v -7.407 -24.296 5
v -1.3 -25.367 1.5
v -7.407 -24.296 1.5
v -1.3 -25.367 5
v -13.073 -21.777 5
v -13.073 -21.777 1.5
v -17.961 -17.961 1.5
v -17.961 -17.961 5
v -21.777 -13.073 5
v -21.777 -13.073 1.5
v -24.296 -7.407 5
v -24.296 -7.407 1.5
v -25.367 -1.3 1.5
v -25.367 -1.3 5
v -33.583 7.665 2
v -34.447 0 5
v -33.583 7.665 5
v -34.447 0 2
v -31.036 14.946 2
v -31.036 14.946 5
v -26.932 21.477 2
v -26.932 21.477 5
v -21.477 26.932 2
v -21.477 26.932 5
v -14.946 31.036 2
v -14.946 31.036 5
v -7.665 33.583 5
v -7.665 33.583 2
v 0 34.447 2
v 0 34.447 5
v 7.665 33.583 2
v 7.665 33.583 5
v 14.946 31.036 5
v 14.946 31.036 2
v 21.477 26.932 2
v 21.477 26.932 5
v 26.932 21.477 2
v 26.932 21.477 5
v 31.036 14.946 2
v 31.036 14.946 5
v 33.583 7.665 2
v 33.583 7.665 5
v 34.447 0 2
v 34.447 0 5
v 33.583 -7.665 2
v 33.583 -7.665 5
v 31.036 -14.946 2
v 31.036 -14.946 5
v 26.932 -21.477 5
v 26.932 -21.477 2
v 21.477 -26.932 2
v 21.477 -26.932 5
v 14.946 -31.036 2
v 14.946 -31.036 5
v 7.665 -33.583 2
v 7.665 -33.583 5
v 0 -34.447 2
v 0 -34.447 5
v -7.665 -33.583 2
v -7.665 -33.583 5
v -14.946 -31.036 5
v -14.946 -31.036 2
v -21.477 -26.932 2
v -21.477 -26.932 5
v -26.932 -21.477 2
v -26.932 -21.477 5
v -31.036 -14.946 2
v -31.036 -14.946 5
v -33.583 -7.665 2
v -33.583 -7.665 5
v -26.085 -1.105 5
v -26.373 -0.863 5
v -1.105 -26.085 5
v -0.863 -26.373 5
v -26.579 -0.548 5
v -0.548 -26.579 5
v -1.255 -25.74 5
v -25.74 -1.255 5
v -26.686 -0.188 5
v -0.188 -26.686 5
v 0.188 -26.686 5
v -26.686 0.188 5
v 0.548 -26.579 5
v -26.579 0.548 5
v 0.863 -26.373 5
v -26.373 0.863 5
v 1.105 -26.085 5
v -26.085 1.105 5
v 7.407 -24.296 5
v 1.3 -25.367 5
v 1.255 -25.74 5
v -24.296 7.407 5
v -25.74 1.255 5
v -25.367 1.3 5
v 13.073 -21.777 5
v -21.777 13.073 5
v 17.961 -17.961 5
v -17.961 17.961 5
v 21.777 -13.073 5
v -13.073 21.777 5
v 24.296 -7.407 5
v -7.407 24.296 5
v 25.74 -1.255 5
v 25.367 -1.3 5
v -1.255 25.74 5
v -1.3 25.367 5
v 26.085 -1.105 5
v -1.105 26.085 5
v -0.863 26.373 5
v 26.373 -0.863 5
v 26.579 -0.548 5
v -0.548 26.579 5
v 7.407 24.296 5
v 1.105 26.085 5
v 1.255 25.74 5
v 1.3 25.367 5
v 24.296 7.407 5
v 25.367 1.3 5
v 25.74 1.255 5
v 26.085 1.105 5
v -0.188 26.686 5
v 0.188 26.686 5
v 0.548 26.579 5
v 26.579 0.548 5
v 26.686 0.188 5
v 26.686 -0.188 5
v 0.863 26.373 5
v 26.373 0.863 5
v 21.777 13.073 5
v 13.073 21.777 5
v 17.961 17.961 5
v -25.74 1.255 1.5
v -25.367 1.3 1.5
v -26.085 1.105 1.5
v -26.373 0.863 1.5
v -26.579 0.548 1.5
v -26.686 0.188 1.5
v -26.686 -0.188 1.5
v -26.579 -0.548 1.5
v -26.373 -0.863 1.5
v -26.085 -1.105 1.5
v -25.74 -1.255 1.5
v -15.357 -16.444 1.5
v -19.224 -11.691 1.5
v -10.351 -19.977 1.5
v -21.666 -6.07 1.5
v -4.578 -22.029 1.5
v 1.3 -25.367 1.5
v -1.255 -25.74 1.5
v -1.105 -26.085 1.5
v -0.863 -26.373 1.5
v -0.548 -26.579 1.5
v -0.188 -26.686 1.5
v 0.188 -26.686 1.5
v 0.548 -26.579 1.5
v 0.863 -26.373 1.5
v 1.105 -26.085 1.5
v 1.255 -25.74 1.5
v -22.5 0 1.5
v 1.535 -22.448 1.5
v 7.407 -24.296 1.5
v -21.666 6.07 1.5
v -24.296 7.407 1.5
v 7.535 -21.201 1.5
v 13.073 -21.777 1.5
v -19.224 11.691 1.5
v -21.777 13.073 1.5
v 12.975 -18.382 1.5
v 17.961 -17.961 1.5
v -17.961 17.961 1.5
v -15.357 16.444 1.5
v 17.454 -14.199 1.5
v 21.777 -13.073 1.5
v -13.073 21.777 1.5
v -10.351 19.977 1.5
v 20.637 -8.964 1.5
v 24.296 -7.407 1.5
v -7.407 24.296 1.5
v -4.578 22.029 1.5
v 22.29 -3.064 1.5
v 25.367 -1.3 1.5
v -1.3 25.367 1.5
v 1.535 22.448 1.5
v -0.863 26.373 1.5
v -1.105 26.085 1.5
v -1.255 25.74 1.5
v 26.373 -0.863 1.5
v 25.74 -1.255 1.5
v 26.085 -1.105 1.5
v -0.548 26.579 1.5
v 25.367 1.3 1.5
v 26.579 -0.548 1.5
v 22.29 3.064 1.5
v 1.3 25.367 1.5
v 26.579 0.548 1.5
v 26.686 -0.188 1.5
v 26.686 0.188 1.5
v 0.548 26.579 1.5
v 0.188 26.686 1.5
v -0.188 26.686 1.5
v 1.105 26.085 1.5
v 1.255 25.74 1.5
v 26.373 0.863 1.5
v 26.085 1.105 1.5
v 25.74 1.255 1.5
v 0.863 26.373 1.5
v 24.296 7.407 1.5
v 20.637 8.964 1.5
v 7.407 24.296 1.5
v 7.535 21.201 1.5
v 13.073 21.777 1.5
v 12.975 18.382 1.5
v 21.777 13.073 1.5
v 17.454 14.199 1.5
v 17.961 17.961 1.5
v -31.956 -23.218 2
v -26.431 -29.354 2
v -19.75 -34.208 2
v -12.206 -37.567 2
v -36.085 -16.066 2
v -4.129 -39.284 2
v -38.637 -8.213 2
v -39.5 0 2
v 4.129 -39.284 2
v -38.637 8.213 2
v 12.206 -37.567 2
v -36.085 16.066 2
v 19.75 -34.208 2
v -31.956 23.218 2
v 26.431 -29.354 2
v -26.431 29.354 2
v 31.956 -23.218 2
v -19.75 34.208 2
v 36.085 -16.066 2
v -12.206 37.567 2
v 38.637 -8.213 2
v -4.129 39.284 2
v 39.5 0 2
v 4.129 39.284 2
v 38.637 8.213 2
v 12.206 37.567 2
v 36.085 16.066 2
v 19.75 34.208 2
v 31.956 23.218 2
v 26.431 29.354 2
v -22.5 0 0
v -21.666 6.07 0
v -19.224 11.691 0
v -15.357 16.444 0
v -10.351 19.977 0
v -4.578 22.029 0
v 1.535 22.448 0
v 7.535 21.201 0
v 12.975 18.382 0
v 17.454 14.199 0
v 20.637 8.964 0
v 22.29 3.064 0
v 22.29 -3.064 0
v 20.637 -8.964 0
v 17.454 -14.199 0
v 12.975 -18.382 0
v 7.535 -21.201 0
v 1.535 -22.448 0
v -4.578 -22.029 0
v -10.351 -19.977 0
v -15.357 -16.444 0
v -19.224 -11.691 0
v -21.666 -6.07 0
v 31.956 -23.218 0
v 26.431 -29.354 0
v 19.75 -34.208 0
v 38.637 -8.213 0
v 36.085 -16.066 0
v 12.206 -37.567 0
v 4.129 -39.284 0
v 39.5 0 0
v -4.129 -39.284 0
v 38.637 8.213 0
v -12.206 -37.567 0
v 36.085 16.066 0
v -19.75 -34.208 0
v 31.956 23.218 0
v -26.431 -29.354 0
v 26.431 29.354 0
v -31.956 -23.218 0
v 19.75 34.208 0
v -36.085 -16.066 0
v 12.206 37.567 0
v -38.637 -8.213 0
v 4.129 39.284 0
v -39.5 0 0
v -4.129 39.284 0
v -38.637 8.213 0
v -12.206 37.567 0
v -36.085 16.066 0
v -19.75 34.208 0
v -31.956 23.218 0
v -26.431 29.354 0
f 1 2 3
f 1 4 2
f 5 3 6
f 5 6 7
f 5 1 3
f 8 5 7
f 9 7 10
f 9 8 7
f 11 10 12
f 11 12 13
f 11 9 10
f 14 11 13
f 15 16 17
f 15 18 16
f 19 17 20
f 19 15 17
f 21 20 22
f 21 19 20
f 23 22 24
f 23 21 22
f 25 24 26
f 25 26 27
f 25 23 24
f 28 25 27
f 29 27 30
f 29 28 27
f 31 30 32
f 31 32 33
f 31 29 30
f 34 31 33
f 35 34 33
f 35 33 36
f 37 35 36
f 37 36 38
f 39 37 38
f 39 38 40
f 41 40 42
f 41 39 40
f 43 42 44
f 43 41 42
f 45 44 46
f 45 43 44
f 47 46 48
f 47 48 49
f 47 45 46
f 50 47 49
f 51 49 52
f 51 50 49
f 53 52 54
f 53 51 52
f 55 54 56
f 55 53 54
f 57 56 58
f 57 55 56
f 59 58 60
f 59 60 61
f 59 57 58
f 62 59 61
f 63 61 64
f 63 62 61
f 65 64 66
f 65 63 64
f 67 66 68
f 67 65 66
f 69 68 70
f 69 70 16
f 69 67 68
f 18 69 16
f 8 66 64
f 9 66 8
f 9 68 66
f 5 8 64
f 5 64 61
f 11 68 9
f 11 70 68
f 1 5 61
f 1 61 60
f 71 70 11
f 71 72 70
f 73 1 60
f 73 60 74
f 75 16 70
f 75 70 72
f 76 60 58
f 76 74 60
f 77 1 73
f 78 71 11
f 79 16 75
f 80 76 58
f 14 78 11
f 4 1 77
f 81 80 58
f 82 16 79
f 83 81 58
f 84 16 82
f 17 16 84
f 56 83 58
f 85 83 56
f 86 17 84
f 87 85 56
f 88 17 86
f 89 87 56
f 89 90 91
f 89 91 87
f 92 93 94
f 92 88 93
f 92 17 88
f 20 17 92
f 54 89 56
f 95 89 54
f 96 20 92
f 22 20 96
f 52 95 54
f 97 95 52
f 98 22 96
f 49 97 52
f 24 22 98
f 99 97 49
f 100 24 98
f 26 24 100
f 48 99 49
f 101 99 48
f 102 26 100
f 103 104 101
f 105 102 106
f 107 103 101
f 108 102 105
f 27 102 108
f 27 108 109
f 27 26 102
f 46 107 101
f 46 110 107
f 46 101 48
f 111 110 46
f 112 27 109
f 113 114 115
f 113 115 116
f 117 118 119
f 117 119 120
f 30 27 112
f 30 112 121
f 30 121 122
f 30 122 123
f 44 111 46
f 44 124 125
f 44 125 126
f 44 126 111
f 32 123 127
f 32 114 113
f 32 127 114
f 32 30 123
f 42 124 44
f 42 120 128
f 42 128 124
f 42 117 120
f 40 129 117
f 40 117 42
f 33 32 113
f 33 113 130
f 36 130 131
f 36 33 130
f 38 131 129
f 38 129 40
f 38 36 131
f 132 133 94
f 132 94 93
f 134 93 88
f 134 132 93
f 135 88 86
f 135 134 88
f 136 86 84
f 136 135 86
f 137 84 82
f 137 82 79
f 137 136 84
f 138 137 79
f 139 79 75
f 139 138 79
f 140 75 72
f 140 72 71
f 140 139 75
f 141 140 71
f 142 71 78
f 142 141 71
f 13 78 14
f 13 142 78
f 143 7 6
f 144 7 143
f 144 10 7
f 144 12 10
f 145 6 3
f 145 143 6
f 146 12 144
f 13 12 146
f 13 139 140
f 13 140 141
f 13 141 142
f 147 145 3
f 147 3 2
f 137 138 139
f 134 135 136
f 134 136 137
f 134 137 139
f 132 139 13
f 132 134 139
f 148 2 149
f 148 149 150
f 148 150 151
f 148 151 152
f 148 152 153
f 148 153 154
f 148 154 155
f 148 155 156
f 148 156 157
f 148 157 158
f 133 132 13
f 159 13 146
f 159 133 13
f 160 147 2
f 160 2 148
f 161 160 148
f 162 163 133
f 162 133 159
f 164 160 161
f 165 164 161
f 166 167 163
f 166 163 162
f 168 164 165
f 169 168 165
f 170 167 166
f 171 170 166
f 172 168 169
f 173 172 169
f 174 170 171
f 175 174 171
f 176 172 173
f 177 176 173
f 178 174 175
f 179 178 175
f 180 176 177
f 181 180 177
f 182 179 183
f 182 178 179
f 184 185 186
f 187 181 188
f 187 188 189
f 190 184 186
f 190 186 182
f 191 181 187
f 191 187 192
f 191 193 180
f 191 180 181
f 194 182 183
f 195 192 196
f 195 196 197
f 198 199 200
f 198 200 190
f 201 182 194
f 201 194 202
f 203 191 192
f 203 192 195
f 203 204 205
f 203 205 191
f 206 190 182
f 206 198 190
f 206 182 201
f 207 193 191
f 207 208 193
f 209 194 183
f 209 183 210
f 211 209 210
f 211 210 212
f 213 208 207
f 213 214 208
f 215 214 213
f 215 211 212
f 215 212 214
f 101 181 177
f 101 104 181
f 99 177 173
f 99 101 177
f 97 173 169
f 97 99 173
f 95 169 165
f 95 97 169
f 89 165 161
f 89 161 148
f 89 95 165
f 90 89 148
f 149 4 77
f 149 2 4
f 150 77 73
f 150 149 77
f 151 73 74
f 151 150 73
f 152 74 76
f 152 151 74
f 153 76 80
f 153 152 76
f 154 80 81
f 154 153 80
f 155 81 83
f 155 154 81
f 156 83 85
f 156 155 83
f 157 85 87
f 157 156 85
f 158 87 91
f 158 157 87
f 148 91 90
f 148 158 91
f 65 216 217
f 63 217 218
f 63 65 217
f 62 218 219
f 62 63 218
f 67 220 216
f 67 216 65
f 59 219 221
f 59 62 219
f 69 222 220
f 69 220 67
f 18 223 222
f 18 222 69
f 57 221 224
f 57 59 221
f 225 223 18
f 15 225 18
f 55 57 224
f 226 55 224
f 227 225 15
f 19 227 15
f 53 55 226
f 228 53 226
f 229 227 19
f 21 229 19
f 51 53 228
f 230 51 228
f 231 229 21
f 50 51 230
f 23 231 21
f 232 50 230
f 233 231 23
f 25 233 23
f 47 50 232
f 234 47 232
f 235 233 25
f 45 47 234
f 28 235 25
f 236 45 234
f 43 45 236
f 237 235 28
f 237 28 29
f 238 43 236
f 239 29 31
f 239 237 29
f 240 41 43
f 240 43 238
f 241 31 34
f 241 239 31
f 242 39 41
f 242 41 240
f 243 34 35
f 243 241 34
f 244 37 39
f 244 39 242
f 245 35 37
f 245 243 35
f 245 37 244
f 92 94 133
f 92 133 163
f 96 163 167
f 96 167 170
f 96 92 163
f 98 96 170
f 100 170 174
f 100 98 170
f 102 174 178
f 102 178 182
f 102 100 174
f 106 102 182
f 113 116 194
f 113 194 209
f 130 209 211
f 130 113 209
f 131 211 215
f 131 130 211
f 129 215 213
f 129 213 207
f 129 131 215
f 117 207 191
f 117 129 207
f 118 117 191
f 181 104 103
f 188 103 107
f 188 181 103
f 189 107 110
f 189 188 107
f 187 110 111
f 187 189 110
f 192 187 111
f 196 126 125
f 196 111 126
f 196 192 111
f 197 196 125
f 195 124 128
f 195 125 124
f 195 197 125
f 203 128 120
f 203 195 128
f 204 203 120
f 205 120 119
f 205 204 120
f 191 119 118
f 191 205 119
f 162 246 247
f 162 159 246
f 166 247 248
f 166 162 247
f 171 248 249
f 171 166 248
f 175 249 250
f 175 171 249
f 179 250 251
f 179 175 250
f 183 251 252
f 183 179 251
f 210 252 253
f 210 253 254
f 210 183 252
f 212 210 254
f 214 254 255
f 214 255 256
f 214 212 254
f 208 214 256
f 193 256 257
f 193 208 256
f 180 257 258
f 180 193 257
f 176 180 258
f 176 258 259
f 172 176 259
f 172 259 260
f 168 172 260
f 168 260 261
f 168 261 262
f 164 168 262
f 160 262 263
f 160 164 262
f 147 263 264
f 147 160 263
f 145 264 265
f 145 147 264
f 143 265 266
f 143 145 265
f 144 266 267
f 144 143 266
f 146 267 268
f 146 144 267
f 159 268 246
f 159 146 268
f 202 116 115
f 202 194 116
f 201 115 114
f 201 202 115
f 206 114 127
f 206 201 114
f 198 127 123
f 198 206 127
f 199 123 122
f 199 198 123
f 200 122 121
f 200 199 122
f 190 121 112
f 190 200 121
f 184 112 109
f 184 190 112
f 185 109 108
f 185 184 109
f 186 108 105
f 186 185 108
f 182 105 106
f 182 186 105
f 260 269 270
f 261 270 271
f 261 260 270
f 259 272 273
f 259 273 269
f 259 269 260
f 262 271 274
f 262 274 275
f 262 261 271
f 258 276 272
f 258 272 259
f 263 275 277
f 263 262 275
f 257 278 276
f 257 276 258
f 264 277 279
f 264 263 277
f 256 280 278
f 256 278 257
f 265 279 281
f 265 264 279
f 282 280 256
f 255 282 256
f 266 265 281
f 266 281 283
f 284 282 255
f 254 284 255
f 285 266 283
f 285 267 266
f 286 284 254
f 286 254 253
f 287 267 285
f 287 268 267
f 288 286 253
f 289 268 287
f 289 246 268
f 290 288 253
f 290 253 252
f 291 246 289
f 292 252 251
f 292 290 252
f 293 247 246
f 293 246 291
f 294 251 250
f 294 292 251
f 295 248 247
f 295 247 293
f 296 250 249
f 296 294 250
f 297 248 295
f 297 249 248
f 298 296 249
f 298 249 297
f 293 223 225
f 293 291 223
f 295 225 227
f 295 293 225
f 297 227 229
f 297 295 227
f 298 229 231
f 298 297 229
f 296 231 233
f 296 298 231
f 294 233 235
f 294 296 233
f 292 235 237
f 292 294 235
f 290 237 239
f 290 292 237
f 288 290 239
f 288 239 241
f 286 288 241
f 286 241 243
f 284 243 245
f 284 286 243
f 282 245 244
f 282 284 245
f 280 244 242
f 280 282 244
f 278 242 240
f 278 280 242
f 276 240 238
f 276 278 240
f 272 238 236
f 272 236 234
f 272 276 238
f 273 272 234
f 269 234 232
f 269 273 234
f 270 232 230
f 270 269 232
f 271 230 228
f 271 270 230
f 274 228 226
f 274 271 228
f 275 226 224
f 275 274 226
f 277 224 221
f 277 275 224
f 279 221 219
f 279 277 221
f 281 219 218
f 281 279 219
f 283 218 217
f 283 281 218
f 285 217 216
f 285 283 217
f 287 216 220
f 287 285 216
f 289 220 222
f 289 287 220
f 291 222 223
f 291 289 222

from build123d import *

# Parameters (mm, degrees)
F3_START = 1.5
F2_R     = 1.3
F3_DEPTH = 3.5


with BuildPart() as f1:
    # F0 (on Front) → F1 (revolve)
    with BuildSketch(Plane.XZ):
        Polygon((-39.5, 2), (-39.5, 0), (-22.5, 0), (-22.5, 1.5), (-25.4, 1.5), (-25.4, 5), (-34.4469576932, 5), (-34.4469576932, 2), align=None)
    revolve(axis=Axis((0, 0, 4.7885915264), (0, 0, -1)))

    # F2 (on Top) → F3 (cut)
    with BuildSketch(Plane.XY.offset(F3_START)):
        with Locations((0, 25.4)):
            Circle(F2_R)
        with Locations((-25.4, 0)):
            Circle(F2_R)
        with Locations((0, -25.4)):
            Circle(F2_R)
        with Locations((25.4, 0)):
            Circle(F2_R)
    extrude(amount=F3_DEPTH, mode=Mode.SUBTRACT)


solid = f1.part
